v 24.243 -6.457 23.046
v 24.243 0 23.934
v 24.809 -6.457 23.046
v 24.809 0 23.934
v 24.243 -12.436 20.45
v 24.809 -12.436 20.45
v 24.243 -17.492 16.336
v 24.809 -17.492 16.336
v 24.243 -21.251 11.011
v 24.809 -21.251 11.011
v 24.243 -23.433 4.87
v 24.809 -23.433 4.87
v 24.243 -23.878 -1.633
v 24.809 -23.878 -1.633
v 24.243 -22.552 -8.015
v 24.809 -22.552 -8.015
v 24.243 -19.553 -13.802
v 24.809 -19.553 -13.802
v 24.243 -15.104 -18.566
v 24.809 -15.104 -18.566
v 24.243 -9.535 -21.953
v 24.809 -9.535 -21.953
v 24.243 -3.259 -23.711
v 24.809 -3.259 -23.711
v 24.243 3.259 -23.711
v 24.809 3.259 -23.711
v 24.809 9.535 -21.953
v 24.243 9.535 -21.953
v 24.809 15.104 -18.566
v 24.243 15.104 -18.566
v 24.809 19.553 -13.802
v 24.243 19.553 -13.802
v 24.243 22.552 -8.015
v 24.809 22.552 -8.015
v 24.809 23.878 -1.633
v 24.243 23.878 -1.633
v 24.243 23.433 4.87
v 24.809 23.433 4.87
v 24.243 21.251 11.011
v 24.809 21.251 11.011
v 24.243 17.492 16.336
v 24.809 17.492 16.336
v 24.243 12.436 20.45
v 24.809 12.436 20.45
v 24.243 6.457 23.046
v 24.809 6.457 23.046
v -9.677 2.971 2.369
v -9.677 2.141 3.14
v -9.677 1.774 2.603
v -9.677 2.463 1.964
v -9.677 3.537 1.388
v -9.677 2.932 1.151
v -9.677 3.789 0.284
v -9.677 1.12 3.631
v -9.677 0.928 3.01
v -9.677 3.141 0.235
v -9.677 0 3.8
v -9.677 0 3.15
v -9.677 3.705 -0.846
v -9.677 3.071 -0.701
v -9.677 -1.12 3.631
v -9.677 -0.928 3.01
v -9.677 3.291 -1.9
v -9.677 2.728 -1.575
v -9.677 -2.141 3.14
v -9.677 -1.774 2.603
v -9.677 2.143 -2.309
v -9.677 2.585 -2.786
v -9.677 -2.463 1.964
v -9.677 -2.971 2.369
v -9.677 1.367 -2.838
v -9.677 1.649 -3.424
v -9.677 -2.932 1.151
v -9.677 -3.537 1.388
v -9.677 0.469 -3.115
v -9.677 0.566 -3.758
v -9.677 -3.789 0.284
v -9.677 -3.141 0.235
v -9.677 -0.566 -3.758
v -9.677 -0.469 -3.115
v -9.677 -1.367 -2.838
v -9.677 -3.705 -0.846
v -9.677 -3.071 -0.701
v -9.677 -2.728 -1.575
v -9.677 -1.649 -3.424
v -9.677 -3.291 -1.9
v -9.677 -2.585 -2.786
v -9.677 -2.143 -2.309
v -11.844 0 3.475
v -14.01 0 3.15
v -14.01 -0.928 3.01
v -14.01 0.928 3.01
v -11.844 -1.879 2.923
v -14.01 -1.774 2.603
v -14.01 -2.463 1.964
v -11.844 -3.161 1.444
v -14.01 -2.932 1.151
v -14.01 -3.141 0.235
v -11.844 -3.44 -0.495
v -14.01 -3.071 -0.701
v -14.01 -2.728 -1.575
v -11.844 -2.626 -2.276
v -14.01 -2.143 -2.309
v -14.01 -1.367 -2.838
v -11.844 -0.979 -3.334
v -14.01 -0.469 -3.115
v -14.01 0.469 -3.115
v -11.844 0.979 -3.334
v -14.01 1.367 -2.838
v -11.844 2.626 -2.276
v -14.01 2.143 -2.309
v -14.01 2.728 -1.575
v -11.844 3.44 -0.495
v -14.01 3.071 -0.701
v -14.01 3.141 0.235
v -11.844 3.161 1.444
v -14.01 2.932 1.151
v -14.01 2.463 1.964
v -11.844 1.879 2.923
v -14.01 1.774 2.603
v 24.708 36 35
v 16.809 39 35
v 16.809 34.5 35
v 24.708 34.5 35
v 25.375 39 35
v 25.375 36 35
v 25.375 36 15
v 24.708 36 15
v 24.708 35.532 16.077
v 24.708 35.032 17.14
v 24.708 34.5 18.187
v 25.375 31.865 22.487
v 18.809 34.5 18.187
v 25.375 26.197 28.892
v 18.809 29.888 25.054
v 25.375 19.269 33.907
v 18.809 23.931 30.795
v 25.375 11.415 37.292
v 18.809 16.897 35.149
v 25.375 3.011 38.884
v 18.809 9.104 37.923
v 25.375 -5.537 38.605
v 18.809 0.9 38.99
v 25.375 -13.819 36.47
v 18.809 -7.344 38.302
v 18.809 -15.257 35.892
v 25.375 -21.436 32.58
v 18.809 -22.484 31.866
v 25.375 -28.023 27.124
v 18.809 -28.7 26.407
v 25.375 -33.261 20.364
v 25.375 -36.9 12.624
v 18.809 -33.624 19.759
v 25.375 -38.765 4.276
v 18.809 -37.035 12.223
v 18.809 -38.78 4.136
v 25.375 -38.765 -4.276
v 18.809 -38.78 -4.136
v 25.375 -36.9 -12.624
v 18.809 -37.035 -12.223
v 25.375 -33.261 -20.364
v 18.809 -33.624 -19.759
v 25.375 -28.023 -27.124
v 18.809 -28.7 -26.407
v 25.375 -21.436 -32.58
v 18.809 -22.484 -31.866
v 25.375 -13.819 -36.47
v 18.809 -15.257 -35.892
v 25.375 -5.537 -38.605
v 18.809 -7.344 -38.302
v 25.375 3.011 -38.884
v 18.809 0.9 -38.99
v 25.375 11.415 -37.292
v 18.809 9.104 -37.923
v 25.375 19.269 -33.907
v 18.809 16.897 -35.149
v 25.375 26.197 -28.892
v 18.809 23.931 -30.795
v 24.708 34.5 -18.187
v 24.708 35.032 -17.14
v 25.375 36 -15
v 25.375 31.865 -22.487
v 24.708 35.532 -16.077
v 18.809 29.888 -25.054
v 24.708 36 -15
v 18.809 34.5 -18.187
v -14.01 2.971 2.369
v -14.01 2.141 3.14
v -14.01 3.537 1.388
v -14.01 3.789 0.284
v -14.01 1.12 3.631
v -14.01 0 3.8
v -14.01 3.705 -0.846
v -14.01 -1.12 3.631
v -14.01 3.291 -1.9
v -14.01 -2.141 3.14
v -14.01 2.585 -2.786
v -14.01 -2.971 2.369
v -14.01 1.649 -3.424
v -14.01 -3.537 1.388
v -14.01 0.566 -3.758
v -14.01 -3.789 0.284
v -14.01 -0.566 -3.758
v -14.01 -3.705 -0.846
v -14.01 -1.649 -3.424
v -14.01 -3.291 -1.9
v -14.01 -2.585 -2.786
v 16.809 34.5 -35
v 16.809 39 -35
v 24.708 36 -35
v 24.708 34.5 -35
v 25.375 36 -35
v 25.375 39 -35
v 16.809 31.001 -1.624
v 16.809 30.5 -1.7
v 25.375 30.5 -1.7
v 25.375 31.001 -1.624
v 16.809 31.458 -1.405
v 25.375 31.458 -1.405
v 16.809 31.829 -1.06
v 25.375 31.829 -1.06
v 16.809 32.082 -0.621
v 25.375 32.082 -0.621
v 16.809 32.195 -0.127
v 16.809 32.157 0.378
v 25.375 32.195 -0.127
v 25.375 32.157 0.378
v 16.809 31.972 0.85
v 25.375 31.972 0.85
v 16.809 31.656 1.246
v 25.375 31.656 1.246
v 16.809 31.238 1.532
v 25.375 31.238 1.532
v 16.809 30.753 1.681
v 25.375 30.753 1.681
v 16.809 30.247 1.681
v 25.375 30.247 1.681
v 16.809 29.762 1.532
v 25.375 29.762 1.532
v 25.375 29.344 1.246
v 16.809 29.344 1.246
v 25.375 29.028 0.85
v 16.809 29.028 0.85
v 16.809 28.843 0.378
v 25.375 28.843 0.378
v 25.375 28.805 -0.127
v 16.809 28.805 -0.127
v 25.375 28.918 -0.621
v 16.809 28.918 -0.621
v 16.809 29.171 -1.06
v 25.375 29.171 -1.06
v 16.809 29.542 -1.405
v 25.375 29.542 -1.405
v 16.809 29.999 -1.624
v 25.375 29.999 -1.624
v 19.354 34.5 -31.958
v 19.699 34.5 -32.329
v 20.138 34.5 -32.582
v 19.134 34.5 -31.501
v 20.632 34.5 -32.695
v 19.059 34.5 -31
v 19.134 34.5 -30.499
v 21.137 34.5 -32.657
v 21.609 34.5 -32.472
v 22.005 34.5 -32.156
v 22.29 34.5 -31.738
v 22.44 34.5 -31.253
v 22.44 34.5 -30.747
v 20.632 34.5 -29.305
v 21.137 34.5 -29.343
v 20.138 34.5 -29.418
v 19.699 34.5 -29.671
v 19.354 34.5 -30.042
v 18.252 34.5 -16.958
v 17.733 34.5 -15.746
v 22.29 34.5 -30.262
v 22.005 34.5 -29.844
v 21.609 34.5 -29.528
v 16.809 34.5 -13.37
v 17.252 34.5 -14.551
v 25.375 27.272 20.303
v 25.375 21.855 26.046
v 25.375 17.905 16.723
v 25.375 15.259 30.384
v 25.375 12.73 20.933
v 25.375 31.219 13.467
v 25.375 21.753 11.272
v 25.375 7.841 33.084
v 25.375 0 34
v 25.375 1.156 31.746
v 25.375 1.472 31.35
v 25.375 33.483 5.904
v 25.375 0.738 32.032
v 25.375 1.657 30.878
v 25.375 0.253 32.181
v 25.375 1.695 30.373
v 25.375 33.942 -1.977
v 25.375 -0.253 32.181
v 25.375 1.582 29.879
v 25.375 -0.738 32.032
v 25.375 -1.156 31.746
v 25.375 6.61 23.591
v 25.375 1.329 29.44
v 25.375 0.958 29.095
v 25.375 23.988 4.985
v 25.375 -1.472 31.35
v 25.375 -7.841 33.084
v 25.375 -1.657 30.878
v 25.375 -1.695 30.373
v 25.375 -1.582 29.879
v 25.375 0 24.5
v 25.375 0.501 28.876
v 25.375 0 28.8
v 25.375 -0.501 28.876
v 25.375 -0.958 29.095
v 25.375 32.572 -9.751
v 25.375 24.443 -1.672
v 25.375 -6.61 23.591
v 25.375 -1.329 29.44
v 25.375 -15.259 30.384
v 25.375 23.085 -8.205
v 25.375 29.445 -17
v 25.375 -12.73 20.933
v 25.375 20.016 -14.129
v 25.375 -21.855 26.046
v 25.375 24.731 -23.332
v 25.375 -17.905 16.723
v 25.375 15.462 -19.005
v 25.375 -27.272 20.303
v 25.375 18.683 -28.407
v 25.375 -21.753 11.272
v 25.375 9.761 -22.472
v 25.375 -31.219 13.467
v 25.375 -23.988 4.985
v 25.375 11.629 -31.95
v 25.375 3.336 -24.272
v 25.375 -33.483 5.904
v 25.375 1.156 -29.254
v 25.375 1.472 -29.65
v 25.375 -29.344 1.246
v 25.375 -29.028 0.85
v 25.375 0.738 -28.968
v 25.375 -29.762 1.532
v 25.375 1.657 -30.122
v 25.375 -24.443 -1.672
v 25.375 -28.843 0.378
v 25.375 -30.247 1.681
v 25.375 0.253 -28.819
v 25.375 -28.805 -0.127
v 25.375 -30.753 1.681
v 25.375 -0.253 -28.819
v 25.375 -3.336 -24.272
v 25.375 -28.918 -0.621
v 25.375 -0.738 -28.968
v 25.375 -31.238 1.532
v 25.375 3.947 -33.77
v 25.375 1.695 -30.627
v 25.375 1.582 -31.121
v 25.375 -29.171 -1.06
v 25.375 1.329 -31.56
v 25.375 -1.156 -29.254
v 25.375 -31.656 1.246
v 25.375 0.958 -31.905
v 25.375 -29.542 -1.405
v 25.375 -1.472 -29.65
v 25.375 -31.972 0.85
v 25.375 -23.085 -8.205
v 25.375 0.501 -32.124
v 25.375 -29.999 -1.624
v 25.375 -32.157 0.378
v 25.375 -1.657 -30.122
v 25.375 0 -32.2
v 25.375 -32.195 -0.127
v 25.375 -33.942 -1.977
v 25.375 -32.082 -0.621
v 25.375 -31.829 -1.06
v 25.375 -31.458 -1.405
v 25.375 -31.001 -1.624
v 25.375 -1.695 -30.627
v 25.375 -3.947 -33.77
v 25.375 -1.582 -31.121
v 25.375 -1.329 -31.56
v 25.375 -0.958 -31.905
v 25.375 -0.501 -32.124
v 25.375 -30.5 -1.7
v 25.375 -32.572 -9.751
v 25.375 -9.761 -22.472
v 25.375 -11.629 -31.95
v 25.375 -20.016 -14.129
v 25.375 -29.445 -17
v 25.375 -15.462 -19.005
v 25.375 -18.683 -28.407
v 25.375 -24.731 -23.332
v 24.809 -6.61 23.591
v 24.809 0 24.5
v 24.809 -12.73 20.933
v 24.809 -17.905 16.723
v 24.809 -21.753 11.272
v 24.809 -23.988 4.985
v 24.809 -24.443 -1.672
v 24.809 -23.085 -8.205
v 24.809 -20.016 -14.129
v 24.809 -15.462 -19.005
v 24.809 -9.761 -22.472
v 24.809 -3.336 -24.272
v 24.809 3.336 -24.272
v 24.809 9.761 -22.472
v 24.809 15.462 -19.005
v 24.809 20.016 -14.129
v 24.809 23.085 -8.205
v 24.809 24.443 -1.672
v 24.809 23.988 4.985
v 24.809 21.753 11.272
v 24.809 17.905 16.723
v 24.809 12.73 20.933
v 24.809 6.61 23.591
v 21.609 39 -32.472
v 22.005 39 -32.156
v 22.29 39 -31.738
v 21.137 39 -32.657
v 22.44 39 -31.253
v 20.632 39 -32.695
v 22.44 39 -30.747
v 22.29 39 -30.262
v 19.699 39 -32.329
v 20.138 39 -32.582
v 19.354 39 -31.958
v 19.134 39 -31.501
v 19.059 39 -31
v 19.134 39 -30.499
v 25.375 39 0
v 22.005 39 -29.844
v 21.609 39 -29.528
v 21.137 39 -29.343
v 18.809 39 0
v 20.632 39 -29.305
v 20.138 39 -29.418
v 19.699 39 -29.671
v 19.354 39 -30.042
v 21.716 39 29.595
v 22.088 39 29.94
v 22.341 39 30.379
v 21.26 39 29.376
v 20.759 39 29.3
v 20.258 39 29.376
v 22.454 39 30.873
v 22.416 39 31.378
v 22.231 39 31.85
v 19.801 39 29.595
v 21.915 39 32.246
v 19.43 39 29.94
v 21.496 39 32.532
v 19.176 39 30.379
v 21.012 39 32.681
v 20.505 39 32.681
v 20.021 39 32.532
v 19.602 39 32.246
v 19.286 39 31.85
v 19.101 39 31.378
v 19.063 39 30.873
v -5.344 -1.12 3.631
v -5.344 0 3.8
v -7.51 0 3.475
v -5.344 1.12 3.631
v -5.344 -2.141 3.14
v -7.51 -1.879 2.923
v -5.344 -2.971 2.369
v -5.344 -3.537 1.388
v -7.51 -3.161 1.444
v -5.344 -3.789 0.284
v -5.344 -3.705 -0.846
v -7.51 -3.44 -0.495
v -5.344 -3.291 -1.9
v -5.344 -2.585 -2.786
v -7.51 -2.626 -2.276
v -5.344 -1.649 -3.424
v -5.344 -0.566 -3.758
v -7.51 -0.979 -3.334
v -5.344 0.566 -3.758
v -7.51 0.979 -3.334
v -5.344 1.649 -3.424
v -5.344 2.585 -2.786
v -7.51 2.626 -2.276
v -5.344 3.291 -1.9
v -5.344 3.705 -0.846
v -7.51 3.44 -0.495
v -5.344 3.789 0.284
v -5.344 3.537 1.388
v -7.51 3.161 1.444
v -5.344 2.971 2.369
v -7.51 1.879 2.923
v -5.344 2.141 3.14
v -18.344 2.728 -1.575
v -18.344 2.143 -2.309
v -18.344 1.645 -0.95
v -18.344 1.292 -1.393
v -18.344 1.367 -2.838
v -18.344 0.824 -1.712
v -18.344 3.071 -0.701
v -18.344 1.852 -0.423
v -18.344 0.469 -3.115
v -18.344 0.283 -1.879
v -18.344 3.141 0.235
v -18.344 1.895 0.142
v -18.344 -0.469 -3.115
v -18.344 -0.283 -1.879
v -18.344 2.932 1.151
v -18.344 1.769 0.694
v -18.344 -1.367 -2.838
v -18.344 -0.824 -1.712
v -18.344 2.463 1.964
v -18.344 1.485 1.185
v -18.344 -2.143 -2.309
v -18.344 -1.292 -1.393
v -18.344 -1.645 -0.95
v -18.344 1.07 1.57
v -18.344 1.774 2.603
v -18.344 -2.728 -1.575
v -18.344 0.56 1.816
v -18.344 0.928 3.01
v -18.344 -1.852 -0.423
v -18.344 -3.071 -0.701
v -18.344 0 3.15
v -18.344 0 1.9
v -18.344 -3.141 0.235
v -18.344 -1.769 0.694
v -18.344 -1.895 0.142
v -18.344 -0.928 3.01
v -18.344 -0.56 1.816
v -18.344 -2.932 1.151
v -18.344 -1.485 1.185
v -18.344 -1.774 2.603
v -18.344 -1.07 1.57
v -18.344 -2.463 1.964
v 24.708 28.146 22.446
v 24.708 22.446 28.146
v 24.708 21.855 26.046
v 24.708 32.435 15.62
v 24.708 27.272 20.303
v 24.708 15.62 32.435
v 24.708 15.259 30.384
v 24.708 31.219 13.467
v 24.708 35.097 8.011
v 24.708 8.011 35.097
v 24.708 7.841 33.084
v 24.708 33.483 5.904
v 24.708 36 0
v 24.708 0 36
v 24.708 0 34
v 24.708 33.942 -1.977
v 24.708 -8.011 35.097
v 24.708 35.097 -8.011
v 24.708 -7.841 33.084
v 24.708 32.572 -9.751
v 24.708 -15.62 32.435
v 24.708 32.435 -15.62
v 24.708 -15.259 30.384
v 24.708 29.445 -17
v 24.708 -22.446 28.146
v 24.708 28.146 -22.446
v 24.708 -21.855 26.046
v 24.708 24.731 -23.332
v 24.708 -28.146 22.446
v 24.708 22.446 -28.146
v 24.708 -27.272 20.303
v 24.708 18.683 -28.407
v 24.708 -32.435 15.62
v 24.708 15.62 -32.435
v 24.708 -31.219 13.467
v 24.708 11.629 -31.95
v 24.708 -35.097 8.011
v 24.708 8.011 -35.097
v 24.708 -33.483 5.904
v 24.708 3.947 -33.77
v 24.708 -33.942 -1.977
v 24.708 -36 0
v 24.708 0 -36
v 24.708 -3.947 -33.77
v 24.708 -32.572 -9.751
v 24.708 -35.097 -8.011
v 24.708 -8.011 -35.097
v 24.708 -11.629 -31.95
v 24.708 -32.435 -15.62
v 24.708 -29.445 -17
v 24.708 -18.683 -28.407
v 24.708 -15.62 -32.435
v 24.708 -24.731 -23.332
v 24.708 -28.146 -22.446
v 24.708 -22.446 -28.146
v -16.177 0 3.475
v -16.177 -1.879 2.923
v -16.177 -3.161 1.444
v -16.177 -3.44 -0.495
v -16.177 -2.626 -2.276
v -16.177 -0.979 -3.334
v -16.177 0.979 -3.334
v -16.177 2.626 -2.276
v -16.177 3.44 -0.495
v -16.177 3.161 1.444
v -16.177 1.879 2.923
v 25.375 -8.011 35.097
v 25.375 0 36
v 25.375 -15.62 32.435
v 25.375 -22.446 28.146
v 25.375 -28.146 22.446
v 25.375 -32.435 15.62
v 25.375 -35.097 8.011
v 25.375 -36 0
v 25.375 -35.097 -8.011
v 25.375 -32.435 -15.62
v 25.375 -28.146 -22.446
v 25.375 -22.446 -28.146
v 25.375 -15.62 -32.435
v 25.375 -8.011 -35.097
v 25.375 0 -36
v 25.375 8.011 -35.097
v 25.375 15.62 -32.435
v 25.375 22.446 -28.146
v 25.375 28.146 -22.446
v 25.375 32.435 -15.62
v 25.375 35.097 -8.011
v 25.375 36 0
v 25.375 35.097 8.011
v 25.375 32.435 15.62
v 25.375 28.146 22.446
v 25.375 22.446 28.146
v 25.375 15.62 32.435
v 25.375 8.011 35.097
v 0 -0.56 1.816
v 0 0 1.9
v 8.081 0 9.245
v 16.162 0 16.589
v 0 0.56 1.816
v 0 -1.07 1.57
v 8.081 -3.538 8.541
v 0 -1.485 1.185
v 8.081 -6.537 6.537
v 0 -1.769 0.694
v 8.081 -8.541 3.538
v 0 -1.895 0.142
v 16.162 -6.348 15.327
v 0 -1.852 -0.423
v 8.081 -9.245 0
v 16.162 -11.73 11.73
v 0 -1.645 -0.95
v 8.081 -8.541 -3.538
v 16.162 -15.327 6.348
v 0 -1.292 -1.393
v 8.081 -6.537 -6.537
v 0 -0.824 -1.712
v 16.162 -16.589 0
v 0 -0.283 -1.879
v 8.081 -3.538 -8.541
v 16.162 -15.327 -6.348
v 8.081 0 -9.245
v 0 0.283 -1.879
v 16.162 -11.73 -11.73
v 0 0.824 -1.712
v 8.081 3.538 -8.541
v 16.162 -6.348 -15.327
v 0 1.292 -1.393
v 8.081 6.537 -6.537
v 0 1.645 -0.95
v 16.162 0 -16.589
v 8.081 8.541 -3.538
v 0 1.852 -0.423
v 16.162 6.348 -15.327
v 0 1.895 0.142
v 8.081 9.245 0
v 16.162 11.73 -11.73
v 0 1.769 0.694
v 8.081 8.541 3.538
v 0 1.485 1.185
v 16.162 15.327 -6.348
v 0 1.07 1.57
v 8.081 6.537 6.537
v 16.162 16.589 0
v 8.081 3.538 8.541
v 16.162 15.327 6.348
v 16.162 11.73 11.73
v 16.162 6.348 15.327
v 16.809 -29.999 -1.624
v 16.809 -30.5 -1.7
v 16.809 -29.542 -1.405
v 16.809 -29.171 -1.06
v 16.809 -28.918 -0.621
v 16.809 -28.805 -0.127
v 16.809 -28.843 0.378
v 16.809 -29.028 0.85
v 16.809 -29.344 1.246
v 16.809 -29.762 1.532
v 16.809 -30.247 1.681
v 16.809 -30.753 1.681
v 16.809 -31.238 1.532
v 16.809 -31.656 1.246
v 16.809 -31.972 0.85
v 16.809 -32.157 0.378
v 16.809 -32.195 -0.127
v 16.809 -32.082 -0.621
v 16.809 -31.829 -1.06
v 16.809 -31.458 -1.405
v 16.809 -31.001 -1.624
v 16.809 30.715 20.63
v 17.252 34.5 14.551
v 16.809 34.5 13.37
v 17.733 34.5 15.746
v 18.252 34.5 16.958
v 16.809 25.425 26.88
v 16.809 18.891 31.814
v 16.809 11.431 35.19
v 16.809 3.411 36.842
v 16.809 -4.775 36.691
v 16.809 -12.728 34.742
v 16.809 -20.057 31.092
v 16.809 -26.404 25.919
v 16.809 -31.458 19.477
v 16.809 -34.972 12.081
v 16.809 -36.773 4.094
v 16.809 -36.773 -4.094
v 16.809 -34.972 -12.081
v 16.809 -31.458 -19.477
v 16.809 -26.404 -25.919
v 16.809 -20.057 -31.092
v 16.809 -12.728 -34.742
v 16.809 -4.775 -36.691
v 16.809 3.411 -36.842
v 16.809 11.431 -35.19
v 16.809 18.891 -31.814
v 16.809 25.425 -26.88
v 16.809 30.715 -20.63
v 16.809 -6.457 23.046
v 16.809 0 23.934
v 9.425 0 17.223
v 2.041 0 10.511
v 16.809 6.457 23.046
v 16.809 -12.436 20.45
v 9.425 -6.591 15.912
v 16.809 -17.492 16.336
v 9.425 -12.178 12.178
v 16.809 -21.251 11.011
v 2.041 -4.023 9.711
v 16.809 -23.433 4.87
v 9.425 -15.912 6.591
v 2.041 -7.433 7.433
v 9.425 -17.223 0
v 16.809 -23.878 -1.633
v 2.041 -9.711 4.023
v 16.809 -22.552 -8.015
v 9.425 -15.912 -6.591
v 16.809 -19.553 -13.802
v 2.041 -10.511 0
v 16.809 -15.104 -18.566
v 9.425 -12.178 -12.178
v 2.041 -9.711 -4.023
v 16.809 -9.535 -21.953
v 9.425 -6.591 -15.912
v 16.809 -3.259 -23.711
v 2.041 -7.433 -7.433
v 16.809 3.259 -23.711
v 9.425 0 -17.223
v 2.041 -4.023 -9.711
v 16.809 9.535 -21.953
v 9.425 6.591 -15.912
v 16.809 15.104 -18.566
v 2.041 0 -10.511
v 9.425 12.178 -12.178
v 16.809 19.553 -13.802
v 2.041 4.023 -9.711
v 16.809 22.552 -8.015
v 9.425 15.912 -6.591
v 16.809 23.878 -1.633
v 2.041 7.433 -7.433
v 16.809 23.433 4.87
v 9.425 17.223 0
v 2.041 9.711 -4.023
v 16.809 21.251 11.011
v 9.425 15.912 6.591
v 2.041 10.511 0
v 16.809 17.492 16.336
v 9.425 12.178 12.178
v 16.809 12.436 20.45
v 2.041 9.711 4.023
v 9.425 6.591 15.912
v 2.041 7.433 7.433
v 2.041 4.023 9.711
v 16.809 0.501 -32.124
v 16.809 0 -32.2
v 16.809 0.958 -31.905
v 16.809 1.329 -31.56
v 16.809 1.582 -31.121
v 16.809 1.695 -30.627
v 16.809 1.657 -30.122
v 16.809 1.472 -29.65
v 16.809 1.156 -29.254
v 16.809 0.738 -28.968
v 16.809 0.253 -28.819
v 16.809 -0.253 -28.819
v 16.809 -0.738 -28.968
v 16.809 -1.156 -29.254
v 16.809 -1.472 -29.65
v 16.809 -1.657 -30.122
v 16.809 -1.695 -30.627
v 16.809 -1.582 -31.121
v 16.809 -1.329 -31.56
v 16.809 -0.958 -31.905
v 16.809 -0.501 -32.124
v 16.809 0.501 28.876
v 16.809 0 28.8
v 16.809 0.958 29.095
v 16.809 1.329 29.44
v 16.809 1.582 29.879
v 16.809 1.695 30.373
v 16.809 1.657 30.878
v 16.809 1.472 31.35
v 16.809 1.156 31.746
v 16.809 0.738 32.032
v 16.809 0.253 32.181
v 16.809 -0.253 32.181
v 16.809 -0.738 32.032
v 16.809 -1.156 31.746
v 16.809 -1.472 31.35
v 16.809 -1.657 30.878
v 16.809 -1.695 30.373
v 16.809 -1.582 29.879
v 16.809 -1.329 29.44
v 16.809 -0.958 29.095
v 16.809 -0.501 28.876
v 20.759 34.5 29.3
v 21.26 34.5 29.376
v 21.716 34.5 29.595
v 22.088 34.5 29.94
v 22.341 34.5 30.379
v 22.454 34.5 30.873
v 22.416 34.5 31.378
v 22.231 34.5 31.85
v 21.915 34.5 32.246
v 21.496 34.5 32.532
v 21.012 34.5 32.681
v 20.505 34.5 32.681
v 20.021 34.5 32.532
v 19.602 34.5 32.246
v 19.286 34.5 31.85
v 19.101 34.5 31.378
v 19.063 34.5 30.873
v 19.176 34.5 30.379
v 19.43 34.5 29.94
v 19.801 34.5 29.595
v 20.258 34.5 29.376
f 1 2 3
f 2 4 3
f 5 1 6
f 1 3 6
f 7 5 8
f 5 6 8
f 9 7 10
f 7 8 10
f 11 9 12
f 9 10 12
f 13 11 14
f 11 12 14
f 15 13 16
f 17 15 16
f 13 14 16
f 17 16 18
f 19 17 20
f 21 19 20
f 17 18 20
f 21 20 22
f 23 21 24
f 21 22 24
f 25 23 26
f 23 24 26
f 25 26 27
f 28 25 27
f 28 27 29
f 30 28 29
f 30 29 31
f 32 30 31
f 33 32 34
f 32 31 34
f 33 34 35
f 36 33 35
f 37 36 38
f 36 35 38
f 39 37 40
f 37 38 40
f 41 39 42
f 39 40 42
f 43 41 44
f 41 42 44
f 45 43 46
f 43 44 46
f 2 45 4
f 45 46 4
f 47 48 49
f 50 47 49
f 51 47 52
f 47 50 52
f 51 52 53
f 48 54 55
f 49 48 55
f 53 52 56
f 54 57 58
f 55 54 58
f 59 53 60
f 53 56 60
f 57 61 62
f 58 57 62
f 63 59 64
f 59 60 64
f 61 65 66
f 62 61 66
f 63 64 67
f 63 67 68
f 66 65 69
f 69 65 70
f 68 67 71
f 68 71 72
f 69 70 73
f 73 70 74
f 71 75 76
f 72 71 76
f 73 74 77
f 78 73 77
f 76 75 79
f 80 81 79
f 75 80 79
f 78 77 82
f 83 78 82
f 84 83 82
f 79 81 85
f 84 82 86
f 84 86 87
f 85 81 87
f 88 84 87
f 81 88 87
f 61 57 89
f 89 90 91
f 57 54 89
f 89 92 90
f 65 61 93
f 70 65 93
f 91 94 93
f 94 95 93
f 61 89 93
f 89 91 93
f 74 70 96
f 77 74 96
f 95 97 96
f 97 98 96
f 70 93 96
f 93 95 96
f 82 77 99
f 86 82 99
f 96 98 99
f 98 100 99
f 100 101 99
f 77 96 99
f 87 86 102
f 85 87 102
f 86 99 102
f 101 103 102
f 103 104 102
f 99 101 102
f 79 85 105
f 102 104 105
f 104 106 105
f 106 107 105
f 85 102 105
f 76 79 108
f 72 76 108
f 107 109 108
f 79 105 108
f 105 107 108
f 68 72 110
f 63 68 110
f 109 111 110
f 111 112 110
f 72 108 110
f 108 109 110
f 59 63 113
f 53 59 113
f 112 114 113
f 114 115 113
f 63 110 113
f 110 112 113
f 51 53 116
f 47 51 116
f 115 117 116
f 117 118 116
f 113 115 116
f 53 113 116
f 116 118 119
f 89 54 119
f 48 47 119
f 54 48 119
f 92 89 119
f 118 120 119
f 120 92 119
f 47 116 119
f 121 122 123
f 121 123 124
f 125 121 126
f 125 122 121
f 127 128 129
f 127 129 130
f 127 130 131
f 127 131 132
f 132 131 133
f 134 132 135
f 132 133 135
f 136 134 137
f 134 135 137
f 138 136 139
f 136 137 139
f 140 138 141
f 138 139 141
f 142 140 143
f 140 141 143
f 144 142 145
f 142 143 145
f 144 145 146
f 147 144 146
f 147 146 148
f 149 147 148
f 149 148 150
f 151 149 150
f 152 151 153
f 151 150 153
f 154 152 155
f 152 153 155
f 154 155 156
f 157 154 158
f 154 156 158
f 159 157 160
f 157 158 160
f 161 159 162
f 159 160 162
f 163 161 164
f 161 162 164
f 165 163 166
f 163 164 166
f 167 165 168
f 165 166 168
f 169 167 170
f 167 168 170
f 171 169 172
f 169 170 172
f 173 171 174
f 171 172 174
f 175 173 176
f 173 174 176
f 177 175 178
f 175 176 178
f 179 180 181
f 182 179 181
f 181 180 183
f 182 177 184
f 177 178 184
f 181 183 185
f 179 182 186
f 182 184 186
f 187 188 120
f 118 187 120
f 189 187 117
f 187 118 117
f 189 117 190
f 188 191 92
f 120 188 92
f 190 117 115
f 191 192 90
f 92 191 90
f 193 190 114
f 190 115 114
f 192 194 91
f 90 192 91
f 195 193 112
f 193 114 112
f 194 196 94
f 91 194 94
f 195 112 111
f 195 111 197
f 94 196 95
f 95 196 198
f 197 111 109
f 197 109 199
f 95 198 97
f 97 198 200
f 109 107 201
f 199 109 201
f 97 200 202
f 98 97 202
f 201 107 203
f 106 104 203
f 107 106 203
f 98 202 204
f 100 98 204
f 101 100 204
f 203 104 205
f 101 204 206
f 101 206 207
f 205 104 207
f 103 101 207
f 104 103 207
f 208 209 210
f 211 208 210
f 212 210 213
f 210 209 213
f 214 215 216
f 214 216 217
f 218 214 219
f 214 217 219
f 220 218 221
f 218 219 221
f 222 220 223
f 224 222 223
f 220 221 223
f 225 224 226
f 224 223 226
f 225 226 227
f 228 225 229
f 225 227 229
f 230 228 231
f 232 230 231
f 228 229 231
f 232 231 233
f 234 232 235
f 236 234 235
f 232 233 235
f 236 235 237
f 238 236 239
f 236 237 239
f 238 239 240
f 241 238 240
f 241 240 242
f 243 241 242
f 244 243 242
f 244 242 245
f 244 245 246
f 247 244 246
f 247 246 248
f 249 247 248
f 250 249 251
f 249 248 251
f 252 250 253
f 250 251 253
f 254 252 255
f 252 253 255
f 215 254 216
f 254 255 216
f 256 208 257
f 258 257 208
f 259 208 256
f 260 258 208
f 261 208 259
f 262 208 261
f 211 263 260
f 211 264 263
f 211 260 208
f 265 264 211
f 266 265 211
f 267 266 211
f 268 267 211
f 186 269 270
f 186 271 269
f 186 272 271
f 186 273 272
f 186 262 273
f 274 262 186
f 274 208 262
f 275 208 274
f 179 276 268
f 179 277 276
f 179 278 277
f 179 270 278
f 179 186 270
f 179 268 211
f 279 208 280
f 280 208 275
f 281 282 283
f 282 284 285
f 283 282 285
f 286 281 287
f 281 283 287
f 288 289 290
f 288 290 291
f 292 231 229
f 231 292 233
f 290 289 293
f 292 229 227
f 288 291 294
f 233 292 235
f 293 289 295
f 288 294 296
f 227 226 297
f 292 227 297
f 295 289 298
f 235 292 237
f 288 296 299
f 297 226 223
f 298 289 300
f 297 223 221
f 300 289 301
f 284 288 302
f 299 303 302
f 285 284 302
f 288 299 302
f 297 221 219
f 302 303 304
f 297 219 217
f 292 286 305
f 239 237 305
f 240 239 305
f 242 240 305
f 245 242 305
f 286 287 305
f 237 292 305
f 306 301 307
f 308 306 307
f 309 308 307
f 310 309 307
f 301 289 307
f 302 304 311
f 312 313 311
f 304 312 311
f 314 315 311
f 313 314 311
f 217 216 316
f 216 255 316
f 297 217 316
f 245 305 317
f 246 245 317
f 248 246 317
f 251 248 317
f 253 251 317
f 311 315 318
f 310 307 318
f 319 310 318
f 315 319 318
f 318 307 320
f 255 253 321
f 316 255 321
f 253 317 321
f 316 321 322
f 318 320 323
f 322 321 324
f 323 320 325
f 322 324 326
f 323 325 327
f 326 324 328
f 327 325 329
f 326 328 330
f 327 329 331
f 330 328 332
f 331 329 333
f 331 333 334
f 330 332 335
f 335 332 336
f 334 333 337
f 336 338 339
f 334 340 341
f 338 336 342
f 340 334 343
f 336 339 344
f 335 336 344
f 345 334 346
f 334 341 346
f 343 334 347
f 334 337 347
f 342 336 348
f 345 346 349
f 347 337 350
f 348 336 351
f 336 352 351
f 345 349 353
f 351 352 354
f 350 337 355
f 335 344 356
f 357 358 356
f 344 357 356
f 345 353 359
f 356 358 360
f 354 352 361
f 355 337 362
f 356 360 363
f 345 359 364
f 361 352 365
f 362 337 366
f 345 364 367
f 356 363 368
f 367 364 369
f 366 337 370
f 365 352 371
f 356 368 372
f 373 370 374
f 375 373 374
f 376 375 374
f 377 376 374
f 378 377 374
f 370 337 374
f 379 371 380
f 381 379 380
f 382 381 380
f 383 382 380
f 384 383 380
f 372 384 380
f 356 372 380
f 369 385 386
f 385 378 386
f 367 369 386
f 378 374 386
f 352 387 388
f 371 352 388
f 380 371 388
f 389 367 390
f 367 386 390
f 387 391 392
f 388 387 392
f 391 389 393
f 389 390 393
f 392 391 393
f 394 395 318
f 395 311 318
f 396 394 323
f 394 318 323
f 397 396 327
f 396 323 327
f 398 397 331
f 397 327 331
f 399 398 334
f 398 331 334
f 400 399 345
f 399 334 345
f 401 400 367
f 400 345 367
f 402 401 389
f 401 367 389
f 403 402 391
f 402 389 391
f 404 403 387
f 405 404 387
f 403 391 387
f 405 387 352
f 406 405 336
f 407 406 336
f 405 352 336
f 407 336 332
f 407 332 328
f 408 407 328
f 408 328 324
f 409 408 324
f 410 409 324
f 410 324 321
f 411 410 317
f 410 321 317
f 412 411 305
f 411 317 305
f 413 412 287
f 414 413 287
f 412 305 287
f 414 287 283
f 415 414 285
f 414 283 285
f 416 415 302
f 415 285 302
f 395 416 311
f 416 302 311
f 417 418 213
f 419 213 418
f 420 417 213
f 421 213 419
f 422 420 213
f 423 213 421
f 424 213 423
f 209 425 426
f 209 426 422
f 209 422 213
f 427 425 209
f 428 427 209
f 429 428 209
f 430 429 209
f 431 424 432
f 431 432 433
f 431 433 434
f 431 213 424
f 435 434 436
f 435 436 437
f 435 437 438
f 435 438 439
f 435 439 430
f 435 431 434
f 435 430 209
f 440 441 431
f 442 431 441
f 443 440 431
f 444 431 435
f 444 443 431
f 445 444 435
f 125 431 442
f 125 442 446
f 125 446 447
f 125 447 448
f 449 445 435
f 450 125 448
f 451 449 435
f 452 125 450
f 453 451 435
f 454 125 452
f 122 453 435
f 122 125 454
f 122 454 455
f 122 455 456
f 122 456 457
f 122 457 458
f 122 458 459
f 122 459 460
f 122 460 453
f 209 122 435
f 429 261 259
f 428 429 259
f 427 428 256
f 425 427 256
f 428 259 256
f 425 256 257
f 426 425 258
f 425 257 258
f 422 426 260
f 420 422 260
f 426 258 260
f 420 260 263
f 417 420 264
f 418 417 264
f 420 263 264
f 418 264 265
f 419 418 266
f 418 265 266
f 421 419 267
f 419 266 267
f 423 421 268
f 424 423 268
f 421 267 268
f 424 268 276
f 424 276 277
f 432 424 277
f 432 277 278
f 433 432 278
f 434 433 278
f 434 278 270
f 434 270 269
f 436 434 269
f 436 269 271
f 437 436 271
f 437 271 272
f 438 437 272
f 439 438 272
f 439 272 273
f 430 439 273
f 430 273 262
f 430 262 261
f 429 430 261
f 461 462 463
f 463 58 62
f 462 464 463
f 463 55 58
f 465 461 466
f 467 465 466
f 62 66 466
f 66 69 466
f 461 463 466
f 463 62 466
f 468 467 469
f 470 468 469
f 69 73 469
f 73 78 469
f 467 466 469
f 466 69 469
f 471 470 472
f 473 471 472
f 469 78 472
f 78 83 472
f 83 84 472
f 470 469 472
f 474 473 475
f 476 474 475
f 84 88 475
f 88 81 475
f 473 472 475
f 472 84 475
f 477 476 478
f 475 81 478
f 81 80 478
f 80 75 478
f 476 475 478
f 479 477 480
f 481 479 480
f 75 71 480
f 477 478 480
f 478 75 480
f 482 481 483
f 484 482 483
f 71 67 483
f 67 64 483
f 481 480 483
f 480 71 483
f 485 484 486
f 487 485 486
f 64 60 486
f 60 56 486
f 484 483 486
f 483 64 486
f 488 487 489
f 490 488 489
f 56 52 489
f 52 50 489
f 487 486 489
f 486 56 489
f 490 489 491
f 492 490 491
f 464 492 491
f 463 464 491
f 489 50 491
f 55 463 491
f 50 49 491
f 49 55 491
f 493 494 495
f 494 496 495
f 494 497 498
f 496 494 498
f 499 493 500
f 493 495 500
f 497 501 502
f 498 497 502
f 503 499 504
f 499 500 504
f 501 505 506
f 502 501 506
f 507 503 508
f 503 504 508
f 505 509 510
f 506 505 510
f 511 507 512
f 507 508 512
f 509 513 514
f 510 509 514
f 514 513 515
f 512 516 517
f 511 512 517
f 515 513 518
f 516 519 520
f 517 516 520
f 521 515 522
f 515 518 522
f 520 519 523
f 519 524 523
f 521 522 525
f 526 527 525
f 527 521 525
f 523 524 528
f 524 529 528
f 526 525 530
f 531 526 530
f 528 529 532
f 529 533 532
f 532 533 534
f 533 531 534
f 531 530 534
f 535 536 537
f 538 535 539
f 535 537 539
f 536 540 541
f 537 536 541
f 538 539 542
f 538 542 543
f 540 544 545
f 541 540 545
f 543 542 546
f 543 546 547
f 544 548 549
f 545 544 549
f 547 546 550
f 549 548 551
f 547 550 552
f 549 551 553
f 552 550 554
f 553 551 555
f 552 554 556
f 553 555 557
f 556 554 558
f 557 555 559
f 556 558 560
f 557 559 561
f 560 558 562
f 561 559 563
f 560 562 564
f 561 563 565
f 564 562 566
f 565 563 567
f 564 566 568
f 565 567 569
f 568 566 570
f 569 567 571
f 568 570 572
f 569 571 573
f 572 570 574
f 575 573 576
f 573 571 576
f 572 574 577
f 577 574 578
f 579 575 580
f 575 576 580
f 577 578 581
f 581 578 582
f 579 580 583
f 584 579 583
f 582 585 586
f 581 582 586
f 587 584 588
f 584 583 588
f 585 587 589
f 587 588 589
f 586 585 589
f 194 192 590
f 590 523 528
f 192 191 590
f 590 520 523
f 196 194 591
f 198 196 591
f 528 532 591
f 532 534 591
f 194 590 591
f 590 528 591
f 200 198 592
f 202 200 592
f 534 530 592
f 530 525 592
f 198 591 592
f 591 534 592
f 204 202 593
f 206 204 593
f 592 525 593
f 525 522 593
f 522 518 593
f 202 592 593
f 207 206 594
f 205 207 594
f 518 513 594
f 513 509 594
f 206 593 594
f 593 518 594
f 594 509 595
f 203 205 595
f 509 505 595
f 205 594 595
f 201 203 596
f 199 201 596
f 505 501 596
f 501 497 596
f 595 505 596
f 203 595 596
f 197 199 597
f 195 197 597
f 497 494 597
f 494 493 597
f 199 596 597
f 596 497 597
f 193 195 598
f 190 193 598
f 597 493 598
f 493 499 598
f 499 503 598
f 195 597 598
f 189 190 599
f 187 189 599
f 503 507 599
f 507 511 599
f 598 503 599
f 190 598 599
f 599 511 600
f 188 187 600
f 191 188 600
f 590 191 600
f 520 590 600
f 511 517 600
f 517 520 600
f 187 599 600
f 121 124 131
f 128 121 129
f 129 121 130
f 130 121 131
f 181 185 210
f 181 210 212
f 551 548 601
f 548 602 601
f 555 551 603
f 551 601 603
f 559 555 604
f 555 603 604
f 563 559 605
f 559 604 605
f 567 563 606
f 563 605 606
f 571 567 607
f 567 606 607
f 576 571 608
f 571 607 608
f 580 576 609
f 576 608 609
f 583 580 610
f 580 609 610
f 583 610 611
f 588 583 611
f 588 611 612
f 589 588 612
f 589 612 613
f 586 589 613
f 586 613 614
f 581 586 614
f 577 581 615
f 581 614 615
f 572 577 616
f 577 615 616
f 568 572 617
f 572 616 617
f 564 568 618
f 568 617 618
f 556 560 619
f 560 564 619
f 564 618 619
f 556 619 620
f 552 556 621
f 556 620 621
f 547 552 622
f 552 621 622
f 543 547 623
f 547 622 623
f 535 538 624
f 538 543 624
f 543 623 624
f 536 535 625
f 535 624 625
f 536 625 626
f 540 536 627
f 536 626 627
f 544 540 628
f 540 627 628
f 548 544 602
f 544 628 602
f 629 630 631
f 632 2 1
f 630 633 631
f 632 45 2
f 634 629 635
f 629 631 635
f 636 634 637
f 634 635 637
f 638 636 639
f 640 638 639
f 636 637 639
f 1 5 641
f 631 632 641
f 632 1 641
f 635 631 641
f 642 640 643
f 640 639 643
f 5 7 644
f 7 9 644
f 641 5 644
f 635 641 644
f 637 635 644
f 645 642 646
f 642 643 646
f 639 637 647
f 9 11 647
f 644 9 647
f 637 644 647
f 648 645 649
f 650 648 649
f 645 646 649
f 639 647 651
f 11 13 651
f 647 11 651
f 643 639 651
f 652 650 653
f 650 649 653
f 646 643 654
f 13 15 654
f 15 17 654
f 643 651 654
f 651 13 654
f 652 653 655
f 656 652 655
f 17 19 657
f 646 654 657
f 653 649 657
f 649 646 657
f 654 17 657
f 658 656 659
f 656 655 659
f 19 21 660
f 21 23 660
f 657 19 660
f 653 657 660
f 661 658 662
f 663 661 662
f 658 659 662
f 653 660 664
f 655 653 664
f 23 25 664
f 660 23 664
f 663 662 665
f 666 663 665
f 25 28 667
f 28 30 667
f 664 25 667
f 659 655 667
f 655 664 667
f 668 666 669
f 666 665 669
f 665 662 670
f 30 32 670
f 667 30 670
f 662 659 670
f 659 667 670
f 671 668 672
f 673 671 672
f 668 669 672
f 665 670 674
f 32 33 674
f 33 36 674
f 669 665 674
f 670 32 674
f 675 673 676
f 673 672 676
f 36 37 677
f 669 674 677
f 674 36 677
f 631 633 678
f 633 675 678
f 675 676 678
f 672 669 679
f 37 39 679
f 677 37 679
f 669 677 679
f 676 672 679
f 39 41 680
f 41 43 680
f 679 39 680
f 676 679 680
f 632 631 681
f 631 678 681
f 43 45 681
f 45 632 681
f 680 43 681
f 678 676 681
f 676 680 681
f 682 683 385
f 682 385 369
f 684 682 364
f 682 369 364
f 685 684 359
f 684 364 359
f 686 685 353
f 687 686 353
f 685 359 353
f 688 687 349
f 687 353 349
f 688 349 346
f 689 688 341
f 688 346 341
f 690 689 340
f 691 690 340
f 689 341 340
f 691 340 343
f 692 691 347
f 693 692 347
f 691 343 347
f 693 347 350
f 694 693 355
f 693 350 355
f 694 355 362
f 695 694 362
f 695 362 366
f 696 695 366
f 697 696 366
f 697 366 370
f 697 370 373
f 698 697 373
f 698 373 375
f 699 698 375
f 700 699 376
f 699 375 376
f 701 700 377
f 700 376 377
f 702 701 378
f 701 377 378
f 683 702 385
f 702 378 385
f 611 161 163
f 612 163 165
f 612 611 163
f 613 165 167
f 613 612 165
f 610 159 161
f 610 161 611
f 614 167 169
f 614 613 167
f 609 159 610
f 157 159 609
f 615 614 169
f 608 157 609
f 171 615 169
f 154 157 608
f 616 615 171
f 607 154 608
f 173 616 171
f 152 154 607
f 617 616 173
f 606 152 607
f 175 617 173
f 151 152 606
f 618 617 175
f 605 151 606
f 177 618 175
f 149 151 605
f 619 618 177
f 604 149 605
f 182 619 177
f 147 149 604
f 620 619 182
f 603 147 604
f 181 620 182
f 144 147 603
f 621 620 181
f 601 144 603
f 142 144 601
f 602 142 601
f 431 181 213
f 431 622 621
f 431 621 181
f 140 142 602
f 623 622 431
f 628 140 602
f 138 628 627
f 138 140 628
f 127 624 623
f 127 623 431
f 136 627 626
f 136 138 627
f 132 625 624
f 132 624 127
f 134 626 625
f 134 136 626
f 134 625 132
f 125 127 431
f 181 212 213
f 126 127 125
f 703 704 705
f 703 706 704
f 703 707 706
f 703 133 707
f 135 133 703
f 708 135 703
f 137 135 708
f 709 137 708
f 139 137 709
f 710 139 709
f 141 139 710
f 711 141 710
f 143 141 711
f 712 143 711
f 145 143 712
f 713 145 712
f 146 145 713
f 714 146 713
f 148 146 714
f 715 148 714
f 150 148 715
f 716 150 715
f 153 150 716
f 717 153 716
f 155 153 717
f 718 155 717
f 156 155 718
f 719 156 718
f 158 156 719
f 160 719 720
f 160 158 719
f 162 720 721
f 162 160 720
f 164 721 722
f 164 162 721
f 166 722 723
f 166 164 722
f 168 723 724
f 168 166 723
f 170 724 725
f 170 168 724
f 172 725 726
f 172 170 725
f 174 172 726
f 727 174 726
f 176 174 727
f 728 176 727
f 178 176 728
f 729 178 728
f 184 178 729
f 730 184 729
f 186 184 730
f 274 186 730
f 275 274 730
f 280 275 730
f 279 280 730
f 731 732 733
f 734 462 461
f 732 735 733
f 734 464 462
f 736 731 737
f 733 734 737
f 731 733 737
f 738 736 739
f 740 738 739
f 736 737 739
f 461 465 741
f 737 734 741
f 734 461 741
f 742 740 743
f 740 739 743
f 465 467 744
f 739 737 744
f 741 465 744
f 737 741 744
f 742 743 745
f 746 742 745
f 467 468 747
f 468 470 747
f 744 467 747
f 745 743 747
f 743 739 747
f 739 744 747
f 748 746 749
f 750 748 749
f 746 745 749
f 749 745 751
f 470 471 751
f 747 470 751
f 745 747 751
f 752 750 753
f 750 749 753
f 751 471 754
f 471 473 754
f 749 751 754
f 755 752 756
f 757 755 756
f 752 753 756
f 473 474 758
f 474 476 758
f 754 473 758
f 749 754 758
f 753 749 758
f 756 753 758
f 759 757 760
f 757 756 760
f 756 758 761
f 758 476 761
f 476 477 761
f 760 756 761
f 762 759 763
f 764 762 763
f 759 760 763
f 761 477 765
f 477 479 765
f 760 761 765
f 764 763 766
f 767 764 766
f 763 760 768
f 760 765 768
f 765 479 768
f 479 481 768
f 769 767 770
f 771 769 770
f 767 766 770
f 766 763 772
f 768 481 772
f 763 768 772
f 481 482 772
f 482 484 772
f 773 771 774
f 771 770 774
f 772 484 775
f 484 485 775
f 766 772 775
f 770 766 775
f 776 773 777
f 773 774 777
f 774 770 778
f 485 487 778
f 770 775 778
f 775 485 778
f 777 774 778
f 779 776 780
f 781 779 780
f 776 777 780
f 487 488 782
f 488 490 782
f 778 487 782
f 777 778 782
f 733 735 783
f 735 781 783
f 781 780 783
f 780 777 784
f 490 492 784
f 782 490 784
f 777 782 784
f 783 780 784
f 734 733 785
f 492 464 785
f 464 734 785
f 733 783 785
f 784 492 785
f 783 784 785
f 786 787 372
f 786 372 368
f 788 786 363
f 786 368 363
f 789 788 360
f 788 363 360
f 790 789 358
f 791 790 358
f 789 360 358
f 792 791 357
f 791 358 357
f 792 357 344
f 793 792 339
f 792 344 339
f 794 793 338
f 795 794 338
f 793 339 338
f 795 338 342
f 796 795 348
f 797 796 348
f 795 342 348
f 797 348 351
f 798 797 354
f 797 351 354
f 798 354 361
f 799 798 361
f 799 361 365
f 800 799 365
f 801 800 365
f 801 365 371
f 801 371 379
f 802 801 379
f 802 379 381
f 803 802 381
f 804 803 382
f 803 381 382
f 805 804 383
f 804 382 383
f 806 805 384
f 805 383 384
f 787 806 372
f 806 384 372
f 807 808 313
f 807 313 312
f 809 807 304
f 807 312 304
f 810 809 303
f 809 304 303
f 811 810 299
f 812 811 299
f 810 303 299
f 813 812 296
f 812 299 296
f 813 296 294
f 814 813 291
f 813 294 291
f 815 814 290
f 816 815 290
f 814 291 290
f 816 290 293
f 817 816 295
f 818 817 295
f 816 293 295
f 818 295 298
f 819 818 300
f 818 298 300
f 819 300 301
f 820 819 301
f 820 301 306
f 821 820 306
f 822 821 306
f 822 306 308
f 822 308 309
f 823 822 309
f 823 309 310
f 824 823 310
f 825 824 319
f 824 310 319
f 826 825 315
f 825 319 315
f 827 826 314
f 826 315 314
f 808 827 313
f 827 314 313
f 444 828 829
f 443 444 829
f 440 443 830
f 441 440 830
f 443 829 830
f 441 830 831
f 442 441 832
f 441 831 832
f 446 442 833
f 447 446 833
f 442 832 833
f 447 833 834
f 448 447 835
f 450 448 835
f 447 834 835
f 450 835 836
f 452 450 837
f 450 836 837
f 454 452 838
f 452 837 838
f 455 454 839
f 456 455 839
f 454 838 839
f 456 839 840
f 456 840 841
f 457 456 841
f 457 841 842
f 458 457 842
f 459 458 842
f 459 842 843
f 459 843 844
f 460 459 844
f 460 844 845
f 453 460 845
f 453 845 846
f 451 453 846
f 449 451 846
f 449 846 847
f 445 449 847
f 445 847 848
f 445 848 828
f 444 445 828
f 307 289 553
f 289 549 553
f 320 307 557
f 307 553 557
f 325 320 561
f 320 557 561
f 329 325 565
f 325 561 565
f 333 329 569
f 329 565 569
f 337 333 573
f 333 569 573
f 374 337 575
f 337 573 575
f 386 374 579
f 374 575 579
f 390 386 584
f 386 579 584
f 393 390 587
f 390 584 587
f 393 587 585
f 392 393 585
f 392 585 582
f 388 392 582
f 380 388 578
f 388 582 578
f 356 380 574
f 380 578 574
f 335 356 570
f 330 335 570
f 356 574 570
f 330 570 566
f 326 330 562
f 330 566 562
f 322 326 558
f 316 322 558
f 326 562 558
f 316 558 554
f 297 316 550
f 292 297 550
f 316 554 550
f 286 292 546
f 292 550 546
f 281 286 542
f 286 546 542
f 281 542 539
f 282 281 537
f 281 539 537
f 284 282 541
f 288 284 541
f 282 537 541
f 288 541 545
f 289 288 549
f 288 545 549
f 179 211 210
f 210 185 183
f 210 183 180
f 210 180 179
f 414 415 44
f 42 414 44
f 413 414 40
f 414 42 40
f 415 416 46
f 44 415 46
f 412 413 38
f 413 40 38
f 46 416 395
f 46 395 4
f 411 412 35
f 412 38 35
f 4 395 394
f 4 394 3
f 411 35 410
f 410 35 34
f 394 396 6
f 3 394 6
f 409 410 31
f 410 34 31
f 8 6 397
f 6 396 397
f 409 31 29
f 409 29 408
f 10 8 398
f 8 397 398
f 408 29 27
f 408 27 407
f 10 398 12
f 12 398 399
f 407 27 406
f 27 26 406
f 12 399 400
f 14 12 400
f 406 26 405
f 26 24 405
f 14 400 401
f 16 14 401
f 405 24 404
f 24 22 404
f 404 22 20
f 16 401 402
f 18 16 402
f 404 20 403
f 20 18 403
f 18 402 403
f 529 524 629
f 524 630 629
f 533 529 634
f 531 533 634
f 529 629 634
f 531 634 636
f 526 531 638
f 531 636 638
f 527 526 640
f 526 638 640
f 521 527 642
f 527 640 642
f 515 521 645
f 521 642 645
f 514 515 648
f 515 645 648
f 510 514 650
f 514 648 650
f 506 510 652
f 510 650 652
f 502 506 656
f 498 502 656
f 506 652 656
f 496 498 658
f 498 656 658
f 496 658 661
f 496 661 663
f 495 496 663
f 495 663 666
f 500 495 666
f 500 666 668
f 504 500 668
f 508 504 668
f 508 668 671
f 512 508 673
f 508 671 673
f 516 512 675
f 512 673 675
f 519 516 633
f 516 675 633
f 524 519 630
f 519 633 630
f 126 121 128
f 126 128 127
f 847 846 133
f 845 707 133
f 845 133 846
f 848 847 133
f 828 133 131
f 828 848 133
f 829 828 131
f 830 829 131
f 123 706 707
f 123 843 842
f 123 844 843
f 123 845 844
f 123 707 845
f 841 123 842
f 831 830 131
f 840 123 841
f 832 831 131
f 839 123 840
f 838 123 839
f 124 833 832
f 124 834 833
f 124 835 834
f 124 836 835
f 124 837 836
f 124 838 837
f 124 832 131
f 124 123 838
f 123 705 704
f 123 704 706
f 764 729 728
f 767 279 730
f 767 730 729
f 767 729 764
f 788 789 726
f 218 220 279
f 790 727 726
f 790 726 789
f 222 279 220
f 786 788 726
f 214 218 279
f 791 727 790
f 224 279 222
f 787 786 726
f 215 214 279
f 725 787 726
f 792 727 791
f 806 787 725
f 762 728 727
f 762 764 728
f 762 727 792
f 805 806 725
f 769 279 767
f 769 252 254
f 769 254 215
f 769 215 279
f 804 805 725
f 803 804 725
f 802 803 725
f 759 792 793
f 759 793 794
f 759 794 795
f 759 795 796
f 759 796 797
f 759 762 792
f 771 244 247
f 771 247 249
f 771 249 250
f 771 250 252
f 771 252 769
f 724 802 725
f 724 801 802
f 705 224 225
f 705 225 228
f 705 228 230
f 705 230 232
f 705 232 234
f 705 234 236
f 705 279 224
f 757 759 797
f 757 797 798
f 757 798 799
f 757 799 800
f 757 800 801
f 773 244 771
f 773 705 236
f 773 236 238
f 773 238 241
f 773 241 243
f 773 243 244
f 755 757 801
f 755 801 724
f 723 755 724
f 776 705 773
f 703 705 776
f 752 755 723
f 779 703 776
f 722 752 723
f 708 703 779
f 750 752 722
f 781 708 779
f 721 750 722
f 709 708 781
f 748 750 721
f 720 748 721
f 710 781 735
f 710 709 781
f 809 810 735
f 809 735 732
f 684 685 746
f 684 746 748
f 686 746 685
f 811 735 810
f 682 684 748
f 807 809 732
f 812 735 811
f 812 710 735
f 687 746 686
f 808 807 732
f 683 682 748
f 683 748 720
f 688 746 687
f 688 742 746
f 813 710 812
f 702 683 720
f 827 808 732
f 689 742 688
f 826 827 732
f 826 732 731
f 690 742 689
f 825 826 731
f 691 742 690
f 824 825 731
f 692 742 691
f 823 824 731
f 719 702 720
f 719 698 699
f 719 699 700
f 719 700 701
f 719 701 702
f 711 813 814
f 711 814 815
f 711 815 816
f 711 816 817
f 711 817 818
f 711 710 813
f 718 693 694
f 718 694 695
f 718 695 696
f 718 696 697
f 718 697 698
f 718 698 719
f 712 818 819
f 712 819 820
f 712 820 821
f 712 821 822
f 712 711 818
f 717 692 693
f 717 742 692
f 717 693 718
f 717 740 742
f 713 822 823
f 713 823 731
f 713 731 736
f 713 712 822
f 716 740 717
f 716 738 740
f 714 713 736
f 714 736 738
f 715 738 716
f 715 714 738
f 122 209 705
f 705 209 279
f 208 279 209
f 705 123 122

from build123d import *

# Parameters (mm, degrees)
M3_CLEARANCE_HOLE1_D     = 3.4
M3_CLEARANCE_HOLE1_DEPTH = 8.566
M3_CLEARANCE_HOLE1_TIP   = 1.021463052
CHAMFER1_SIZE            = 2
BOSS_EXTRUDE1_DEPTH      = 35
SKETCH9_R                = 1.7
CUT_EXTRUDE1_DEPTH       = 10


with BuildPart() as part:
    # Sketch1 → Revolve17 (revolve)
    with BuildSketch(Plane.XY):
        Polygon((-14.010170791, 3.15), (-14.010170791, 3.8), (-18.343504124, 3.15), (-18.343504124, 1.9), (0, 1.9), (24.243150592, 23.934), (24.809150592, 23.934), (24.809150592, 24.5), (25.375150592, 24.5), (25.375150592, 34), (24.708150592, 34), (24.708150592, 36), (25.375150592, 36), (25.375150592, 39), (16.809150592, 39), (16.809150592, 23.934), (-5.343504124, 3.8), (-9.676837458, 3.15), (-9.676837458, 3.8), align=None)
    revolve(axis=Axis((-801.927103621, 0, 0), (1, 0, 0)))

    # M3 Clearance Hole1
    with Locations(Plane.ZY.offset(-16.809150592)):
        with Locations((0, -30.5), (0, 30.5), (30.5, 0), (-30.5, 0)):
            Hole(M3_CLEARANCE_HOLE1_D / 2, depth=M3_CLEARANCE_HOLE1_DEPTH)
            with Locations((0, 0, -(M3_CLEARANCE_HOLE1_DEPTH + M3_CLEARANCE_HOLE1_TIP / 2))):  # 118° drill point
                Cone(0, M3_CLEARANCE_HOLE1_D / 2, M3_CLEARANCE_HOLE1_TIP, mode=Mode.SUBTRACT)

    # Chamfer1
    chamfer1_edges = [part.edges().sort_by_distance(p)[0] for p in [
        (16.809150592, -39, 0),
    ]]
    chamfer(chamfer1_edges, length=CHAMFER1_SIZE)

    # Sketch1<11> → Boss-Extrude1 (add, symmetric)
    with BuildSketch(Plane.XY):
        Polygon((16.809150592, 39), (16.809150592, 34.5), (24.708150592, 34.5), (24.708150592, 36), (25.375150592, 36), (25.375150592, 39), align=None)
    extrude(amount=BOSS_EXTRUDE1_DEPTH, both=True)

    # Sketch9 → Cut-Extrude1 (cut)
    with BuildSketch(Plane(origin=(0, 34.5, 0), x_dir=(-1, 0, 0), z_dir=(0, -1, 0))):
        with Locations((-20.758650592, -31)):
            Circle(SKETCH9_R)
        with Locations((-20.758650592, 31)):
            Circle(SKETCH9_R)
    extrude(amount=-CUT_EXTRUDE1_DEPTH, mode=Mode.SUBTRACT)


solid = part.part
